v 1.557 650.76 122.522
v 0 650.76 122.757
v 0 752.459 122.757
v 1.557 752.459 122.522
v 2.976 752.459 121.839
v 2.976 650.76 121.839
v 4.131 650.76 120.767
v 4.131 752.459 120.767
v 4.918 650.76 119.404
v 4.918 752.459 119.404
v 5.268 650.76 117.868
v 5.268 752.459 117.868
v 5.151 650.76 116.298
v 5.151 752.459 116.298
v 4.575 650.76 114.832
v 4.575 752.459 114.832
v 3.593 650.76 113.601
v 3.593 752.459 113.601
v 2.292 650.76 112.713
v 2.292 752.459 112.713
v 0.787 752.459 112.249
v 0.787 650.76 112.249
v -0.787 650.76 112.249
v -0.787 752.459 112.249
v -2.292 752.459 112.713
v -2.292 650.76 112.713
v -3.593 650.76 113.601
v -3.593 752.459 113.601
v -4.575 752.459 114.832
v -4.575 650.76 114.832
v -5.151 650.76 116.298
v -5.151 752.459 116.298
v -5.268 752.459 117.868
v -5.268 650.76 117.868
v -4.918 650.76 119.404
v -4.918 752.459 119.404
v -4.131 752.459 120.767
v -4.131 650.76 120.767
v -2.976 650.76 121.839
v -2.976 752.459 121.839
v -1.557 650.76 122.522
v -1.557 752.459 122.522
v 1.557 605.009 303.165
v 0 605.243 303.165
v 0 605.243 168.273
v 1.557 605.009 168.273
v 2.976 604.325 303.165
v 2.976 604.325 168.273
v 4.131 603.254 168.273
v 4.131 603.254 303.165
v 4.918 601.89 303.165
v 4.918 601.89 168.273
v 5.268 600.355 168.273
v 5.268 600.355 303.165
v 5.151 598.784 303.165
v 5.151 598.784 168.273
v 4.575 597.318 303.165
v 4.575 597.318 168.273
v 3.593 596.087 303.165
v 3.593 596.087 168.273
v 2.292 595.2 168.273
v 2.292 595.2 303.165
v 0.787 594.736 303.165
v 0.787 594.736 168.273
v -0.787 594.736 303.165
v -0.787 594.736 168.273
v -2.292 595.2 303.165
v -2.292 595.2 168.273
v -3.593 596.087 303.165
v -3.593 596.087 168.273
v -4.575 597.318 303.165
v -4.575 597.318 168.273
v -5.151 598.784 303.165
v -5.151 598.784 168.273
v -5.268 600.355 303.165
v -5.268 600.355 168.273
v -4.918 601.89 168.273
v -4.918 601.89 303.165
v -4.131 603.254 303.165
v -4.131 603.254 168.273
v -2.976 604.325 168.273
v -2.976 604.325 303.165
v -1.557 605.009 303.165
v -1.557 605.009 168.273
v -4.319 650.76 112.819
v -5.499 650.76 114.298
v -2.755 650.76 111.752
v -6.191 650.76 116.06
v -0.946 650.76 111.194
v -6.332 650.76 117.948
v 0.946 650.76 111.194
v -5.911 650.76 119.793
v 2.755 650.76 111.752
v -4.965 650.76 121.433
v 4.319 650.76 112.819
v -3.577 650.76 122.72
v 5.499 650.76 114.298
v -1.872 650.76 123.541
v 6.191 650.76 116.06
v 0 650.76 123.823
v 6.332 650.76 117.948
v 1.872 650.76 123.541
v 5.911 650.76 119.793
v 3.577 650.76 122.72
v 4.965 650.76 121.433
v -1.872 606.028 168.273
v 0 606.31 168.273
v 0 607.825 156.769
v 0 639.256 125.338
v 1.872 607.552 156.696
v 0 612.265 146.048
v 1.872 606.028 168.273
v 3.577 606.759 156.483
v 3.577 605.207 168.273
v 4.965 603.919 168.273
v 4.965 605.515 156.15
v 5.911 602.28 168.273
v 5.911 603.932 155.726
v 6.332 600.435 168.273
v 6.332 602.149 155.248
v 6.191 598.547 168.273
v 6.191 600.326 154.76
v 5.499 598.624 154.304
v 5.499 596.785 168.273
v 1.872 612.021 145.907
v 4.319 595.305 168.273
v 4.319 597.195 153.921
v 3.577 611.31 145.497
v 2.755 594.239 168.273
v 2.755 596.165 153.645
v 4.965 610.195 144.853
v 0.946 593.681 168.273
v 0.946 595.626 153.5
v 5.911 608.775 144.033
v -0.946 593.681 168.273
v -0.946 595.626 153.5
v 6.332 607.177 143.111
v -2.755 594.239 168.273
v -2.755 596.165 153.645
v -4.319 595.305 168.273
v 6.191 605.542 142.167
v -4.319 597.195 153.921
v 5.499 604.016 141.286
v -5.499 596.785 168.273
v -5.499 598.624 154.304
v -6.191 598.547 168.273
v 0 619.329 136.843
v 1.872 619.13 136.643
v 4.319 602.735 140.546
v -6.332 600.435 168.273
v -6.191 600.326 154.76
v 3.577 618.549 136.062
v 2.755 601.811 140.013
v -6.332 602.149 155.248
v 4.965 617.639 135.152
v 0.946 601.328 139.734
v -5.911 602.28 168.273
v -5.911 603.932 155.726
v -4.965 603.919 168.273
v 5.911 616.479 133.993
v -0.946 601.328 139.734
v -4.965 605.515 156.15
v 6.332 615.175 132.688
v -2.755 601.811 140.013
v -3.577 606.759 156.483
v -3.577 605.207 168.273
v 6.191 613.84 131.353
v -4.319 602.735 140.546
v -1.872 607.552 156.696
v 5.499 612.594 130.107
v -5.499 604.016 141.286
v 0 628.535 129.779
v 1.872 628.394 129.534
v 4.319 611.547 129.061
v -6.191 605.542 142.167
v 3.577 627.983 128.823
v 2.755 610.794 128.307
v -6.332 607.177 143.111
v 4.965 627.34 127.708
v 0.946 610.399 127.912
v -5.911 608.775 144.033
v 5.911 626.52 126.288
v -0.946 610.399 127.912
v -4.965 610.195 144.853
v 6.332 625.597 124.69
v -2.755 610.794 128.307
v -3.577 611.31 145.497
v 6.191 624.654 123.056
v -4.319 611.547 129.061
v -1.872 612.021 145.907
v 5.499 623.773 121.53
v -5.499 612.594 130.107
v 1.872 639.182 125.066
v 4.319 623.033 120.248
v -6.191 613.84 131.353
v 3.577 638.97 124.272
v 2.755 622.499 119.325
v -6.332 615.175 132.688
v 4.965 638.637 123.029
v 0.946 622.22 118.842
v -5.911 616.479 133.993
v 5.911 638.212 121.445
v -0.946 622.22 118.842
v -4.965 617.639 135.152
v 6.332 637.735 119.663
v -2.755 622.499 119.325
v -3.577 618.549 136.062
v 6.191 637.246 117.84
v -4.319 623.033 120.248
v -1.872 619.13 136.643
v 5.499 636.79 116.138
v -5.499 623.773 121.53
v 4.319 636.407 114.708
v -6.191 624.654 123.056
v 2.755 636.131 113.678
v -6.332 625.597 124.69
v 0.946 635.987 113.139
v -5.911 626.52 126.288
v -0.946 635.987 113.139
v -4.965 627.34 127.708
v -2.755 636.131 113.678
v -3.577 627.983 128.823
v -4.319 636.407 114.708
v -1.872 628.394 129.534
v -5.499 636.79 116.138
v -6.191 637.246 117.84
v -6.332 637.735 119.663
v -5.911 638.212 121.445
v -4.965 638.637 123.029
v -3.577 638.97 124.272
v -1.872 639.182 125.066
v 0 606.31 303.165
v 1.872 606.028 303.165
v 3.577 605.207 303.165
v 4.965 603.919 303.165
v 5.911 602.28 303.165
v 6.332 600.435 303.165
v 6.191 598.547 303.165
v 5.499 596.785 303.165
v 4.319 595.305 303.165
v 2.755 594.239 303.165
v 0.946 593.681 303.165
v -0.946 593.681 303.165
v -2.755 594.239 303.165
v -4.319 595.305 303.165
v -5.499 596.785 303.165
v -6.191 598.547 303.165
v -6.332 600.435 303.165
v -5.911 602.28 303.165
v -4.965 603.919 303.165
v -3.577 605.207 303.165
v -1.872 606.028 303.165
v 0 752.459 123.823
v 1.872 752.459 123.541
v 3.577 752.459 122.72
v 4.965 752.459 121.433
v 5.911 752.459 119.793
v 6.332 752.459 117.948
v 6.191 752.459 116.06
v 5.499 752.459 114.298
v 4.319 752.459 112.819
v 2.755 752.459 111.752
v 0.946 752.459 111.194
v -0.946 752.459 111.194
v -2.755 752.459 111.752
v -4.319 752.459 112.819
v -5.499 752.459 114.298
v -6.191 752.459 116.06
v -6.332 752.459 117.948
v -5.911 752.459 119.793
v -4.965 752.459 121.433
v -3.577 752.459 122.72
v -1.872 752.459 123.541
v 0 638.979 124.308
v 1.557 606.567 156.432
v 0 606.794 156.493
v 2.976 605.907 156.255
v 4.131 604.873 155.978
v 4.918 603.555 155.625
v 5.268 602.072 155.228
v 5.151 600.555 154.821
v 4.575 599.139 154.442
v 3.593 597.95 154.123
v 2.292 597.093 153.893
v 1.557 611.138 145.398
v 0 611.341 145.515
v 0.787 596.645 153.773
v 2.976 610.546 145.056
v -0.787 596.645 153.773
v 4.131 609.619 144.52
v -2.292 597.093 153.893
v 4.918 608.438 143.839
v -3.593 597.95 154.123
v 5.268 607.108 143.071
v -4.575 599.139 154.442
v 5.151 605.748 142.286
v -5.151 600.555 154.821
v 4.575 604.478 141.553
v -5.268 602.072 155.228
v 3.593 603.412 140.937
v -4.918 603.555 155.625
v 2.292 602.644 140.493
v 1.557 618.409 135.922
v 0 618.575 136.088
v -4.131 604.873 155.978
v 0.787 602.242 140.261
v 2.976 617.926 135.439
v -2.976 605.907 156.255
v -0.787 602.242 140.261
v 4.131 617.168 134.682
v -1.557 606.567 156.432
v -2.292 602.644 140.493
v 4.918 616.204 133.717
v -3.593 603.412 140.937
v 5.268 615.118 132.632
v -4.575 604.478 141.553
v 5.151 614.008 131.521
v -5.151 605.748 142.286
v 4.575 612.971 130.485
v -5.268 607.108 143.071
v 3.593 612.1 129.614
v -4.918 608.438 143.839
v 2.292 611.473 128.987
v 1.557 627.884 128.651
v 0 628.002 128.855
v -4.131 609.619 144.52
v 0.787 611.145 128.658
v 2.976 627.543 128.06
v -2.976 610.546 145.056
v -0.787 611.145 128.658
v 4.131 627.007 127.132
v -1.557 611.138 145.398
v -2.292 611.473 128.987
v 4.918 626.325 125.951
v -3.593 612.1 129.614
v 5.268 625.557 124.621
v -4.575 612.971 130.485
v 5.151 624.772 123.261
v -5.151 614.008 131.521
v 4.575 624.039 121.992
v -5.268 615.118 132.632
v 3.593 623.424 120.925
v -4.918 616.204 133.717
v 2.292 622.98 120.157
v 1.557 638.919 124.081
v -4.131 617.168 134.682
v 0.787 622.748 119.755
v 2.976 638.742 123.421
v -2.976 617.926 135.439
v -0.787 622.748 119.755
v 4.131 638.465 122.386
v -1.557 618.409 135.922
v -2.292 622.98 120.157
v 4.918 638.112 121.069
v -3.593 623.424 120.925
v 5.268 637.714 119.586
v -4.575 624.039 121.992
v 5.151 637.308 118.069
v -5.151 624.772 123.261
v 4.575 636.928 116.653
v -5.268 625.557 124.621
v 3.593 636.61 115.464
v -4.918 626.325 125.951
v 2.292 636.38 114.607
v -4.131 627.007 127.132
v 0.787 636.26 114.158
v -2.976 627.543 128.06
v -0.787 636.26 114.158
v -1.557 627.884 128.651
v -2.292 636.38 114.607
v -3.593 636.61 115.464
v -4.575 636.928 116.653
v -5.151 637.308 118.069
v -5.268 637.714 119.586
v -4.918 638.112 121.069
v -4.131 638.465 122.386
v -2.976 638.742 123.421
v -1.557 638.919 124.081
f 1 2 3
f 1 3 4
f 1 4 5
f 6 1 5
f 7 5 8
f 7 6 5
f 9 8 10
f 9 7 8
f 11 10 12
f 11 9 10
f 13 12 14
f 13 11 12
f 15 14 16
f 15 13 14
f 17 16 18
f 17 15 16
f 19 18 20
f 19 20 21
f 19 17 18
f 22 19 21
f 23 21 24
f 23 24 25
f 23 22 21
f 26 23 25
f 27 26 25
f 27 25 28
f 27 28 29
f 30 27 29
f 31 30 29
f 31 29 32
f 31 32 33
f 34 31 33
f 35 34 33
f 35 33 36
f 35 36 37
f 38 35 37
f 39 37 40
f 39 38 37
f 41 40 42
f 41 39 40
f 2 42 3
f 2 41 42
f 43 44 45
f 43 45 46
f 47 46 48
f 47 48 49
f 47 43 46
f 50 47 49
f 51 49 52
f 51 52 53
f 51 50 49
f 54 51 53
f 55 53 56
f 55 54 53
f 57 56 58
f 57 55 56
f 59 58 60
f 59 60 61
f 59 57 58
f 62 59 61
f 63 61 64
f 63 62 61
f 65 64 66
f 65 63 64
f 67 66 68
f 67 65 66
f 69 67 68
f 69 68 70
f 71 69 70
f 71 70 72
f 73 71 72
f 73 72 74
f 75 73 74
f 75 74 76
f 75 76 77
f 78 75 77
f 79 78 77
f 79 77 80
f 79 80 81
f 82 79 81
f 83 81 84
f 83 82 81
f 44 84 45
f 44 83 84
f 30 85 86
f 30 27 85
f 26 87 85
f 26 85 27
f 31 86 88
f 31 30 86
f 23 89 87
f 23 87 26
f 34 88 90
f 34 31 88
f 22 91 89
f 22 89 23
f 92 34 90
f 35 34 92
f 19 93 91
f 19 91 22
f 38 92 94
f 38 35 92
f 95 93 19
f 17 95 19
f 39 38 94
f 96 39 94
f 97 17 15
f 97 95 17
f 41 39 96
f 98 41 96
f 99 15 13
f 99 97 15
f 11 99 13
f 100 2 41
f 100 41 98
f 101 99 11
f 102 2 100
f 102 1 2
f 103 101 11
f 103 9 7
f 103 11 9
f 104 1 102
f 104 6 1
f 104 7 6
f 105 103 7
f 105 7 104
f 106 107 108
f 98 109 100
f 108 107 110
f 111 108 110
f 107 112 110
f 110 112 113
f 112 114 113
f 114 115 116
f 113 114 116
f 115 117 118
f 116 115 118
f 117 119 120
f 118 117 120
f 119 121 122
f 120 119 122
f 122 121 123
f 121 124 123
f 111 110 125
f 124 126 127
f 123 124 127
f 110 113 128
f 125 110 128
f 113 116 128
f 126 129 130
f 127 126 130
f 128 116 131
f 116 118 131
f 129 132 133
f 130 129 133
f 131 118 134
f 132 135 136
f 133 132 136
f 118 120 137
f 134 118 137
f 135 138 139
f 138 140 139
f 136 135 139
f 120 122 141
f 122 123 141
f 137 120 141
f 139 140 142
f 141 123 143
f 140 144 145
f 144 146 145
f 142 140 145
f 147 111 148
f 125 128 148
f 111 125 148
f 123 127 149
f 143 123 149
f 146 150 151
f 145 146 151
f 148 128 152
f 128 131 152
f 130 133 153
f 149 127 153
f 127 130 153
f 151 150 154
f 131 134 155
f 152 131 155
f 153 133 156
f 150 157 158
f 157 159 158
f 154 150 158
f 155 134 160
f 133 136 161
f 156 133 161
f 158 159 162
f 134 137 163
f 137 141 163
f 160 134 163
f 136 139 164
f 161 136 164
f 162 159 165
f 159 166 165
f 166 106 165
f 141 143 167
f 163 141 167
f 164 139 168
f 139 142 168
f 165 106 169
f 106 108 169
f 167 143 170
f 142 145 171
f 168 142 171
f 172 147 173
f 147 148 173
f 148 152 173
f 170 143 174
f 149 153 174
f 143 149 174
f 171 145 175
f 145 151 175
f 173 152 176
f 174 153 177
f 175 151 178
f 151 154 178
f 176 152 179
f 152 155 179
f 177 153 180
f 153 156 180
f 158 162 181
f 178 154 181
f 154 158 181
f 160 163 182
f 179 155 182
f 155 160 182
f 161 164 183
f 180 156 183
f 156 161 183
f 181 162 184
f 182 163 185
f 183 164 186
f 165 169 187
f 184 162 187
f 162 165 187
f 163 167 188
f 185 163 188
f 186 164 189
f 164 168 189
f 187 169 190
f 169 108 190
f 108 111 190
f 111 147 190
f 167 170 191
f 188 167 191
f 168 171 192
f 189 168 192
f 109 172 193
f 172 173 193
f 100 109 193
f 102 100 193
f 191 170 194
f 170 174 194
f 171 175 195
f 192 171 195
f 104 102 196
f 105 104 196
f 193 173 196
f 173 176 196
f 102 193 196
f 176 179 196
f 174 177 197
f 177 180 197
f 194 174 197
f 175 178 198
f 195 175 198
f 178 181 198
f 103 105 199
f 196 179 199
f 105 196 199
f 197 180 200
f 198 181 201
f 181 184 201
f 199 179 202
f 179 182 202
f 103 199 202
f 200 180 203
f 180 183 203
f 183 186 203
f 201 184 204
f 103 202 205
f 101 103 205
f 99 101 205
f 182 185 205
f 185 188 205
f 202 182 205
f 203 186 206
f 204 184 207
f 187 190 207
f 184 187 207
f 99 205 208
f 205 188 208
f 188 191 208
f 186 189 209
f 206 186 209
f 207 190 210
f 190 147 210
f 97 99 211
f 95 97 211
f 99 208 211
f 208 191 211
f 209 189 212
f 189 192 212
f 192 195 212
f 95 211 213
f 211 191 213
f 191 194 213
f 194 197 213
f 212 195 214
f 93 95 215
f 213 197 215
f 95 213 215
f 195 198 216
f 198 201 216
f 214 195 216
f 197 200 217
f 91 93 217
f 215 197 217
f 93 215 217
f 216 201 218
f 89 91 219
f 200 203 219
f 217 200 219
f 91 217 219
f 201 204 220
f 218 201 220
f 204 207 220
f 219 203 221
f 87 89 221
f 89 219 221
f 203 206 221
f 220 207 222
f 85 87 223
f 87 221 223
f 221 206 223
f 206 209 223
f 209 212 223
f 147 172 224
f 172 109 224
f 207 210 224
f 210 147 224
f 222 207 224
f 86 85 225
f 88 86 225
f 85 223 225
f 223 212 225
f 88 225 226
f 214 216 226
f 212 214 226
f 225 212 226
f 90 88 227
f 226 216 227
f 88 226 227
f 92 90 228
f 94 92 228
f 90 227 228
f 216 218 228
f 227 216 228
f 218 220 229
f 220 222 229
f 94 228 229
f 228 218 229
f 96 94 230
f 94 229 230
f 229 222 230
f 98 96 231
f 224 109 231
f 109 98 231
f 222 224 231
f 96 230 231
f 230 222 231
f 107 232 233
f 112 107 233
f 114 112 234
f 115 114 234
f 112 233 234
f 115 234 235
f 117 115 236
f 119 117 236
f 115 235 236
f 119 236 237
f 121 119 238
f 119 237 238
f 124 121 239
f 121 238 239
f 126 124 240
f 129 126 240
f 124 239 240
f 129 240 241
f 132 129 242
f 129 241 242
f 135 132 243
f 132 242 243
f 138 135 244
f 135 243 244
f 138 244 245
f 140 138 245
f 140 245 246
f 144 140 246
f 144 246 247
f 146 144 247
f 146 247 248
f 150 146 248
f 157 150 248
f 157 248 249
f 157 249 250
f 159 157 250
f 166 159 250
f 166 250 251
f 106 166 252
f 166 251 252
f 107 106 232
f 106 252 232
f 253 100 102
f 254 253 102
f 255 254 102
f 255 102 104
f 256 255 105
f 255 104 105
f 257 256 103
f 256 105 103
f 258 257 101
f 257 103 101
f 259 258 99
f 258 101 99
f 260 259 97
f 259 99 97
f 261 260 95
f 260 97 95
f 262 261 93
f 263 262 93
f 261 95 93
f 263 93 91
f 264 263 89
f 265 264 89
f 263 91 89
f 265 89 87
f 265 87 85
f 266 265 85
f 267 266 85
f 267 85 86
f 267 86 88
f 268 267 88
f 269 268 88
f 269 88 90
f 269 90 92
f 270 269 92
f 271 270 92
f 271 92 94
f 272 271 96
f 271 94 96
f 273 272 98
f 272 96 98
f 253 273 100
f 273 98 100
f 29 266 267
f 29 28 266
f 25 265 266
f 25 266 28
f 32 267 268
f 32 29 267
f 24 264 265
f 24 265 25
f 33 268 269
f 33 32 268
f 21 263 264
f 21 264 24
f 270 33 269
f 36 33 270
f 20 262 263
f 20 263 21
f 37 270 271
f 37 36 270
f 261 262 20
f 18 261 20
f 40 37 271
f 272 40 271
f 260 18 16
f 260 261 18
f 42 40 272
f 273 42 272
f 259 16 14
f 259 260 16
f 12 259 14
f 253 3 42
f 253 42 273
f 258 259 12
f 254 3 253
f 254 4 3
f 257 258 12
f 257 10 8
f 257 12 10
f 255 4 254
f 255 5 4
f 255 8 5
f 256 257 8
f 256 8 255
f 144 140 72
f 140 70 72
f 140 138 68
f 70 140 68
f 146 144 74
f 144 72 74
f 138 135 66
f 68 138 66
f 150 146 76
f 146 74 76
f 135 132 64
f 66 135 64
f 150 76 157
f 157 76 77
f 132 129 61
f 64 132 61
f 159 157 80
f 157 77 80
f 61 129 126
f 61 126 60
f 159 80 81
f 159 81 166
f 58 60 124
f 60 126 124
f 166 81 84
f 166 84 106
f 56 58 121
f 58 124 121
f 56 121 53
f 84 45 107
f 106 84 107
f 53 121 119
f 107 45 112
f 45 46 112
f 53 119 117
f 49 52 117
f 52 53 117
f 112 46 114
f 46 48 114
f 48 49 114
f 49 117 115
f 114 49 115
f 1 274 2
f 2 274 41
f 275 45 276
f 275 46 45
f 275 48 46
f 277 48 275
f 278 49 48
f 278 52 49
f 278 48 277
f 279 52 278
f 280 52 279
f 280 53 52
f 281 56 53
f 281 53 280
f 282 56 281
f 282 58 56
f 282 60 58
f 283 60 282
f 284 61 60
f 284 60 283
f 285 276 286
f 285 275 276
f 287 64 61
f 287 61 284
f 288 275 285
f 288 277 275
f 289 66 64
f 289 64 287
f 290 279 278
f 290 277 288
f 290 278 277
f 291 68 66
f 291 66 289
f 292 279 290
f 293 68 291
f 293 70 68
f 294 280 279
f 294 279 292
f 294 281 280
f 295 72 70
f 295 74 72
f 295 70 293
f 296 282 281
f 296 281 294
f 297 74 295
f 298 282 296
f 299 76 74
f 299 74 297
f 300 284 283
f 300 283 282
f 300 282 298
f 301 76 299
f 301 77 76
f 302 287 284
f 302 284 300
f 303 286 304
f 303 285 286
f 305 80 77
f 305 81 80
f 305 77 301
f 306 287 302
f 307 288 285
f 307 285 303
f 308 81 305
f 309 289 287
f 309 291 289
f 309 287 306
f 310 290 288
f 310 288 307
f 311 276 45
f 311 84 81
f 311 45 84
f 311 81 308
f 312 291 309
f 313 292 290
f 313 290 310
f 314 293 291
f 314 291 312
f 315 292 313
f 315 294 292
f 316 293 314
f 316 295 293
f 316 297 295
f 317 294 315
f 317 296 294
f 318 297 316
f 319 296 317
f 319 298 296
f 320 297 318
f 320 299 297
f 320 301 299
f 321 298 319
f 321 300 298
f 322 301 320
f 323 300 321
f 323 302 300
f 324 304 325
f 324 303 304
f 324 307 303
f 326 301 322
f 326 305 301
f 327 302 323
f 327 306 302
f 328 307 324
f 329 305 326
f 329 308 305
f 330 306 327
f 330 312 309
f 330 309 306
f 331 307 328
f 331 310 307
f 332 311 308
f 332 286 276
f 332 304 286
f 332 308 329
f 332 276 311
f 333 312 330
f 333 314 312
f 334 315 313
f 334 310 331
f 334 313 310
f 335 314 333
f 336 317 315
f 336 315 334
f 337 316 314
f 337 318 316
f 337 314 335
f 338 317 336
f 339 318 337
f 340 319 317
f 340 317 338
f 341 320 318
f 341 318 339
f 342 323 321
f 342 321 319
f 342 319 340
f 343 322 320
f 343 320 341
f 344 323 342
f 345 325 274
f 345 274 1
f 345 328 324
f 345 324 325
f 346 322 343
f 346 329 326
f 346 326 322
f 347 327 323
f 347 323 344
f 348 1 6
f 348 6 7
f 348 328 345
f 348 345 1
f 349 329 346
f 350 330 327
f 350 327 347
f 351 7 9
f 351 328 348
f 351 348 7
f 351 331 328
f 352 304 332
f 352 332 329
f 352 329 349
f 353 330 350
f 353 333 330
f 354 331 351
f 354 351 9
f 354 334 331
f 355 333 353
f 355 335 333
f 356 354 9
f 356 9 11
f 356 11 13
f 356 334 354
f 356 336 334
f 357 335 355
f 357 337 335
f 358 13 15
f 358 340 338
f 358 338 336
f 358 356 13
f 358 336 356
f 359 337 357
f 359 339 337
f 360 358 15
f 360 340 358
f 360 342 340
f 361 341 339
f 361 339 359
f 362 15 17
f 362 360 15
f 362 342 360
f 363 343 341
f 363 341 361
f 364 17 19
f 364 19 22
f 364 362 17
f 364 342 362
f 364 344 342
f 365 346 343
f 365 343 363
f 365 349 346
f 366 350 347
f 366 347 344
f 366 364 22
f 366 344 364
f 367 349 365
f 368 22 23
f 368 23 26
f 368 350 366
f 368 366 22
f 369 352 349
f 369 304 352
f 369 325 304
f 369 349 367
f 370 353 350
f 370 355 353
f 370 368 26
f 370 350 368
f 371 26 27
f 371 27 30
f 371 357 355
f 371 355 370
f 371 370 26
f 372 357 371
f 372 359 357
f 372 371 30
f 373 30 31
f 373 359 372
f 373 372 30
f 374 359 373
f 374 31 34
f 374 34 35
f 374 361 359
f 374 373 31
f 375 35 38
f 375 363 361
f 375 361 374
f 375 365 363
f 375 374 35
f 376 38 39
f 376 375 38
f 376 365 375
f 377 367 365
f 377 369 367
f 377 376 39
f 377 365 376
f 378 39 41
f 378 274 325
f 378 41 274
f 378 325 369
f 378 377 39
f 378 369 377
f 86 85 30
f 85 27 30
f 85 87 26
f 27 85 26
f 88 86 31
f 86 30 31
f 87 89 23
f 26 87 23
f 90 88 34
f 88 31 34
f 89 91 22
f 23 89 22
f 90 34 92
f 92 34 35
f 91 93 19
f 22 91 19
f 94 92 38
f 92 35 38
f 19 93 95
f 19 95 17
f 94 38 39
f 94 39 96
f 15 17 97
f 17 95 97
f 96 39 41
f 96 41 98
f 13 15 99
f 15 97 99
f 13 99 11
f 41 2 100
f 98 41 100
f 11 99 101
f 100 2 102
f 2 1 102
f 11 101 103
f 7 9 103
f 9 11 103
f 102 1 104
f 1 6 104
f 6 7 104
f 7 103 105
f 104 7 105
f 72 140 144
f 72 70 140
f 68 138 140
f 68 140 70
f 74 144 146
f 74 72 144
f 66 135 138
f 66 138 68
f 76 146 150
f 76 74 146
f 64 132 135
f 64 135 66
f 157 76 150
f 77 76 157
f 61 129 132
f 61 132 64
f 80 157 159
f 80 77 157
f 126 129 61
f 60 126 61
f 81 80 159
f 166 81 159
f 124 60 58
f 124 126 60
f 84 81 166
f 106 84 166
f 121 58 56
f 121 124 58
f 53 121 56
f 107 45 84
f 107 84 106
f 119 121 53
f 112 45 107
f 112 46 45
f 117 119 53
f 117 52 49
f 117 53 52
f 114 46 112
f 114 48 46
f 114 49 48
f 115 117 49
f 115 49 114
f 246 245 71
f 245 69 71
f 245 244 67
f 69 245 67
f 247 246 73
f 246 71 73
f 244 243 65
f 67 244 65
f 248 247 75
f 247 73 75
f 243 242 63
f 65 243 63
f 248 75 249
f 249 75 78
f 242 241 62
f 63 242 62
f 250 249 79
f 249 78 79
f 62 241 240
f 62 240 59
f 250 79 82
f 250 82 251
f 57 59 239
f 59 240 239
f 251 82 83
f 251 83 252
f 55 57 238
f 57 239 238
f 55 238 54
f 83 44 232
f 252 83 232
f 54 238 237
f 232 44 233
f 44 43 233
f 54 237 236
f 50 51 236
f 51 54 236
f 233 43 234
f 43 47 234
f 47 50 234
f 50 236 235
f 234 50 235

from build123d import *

# Parameters (mm, degrees)
SKETCH11_R                = 6.35
SKETCH11_R_2              = 5.2832
PIPE_0_5_SCH_40_1_DEPTH   = 134.891141117
SKETCH11_ON_SEGMENT_2_R   = 6.35
SKETCH11_ON_SEGMENT_2_R_2 = 5.2832
PIPE_0_5_SCH_40_1_2_ANGLE = 90
SKETCH11_ON_SEGMENT_3_R   = 6.35
SKETCH11_ON_SEGMENT_3_R_2 = 5.2832
PIPE_0_5_SCH_40_1_3_DEPTH = 101.698598989


with BuildPart() as part:
    # Sketch11 → Pipe 0.5 SCH 40(1) (new body)
    with BuildSketch(Plane(origin=(0, 599.960019272, 303.164595711), x_dir=(0, 1, 0), z_dir=(0, 0, -1))):
        Circle(SKETCH11_R)
        Circle(SKETCH11_R_2, mode=Mode.SUBTRACT)
    extrude(amount=PIPE_0_5_SCH_40_1_DEPTH)


with BuildPart() as body_2:
    # Sketch11 on segment 2 (carried to the start of arc 2) → Pipe 0.5 SCH 40_1 2 (revolve)
    with BuildSketch(Plane(origin=(0, 599.960019272, 168.273454594), x_dir=(0, 1, 0), z_dir=(0, 0, -1))):
        Circle(SKETCH11_ON_SEGMENT_2_R)
        Circle(SKETCH11_ON_SEGMENT_2_R_2, mode=Mode.SUBTRACT)
    revolve(axis=Axis((0, 650.760019272, 168.273454594), (1, 0, 0)), revolution_arc=PIPE_0_5_SCH_40_1_2_ANGLE)


with BuildPart() as body_3:
    # Sketch11 on segment 3 (carried to segment 3) → Pipe 0.5 SCH 40_1 3 (new body)
    with BuildSketch(Plane(origin=(0, 650.760019272, 117.473454594), x_dir=(0, 0, 1), z_dir=(0, 1, 0))):
        Circle(SKETCH11_ON_SEGMENT_3_R)
        Circle(SKETCH11_ON_SEGMENT_3_R_2, mode=Mode.SUBTRACT)
    extrude(amount=PIPE_0_5_SCH_40_1_3_DEPTH)


solid = Compound([part.part, body_2.part, body_3.part])
